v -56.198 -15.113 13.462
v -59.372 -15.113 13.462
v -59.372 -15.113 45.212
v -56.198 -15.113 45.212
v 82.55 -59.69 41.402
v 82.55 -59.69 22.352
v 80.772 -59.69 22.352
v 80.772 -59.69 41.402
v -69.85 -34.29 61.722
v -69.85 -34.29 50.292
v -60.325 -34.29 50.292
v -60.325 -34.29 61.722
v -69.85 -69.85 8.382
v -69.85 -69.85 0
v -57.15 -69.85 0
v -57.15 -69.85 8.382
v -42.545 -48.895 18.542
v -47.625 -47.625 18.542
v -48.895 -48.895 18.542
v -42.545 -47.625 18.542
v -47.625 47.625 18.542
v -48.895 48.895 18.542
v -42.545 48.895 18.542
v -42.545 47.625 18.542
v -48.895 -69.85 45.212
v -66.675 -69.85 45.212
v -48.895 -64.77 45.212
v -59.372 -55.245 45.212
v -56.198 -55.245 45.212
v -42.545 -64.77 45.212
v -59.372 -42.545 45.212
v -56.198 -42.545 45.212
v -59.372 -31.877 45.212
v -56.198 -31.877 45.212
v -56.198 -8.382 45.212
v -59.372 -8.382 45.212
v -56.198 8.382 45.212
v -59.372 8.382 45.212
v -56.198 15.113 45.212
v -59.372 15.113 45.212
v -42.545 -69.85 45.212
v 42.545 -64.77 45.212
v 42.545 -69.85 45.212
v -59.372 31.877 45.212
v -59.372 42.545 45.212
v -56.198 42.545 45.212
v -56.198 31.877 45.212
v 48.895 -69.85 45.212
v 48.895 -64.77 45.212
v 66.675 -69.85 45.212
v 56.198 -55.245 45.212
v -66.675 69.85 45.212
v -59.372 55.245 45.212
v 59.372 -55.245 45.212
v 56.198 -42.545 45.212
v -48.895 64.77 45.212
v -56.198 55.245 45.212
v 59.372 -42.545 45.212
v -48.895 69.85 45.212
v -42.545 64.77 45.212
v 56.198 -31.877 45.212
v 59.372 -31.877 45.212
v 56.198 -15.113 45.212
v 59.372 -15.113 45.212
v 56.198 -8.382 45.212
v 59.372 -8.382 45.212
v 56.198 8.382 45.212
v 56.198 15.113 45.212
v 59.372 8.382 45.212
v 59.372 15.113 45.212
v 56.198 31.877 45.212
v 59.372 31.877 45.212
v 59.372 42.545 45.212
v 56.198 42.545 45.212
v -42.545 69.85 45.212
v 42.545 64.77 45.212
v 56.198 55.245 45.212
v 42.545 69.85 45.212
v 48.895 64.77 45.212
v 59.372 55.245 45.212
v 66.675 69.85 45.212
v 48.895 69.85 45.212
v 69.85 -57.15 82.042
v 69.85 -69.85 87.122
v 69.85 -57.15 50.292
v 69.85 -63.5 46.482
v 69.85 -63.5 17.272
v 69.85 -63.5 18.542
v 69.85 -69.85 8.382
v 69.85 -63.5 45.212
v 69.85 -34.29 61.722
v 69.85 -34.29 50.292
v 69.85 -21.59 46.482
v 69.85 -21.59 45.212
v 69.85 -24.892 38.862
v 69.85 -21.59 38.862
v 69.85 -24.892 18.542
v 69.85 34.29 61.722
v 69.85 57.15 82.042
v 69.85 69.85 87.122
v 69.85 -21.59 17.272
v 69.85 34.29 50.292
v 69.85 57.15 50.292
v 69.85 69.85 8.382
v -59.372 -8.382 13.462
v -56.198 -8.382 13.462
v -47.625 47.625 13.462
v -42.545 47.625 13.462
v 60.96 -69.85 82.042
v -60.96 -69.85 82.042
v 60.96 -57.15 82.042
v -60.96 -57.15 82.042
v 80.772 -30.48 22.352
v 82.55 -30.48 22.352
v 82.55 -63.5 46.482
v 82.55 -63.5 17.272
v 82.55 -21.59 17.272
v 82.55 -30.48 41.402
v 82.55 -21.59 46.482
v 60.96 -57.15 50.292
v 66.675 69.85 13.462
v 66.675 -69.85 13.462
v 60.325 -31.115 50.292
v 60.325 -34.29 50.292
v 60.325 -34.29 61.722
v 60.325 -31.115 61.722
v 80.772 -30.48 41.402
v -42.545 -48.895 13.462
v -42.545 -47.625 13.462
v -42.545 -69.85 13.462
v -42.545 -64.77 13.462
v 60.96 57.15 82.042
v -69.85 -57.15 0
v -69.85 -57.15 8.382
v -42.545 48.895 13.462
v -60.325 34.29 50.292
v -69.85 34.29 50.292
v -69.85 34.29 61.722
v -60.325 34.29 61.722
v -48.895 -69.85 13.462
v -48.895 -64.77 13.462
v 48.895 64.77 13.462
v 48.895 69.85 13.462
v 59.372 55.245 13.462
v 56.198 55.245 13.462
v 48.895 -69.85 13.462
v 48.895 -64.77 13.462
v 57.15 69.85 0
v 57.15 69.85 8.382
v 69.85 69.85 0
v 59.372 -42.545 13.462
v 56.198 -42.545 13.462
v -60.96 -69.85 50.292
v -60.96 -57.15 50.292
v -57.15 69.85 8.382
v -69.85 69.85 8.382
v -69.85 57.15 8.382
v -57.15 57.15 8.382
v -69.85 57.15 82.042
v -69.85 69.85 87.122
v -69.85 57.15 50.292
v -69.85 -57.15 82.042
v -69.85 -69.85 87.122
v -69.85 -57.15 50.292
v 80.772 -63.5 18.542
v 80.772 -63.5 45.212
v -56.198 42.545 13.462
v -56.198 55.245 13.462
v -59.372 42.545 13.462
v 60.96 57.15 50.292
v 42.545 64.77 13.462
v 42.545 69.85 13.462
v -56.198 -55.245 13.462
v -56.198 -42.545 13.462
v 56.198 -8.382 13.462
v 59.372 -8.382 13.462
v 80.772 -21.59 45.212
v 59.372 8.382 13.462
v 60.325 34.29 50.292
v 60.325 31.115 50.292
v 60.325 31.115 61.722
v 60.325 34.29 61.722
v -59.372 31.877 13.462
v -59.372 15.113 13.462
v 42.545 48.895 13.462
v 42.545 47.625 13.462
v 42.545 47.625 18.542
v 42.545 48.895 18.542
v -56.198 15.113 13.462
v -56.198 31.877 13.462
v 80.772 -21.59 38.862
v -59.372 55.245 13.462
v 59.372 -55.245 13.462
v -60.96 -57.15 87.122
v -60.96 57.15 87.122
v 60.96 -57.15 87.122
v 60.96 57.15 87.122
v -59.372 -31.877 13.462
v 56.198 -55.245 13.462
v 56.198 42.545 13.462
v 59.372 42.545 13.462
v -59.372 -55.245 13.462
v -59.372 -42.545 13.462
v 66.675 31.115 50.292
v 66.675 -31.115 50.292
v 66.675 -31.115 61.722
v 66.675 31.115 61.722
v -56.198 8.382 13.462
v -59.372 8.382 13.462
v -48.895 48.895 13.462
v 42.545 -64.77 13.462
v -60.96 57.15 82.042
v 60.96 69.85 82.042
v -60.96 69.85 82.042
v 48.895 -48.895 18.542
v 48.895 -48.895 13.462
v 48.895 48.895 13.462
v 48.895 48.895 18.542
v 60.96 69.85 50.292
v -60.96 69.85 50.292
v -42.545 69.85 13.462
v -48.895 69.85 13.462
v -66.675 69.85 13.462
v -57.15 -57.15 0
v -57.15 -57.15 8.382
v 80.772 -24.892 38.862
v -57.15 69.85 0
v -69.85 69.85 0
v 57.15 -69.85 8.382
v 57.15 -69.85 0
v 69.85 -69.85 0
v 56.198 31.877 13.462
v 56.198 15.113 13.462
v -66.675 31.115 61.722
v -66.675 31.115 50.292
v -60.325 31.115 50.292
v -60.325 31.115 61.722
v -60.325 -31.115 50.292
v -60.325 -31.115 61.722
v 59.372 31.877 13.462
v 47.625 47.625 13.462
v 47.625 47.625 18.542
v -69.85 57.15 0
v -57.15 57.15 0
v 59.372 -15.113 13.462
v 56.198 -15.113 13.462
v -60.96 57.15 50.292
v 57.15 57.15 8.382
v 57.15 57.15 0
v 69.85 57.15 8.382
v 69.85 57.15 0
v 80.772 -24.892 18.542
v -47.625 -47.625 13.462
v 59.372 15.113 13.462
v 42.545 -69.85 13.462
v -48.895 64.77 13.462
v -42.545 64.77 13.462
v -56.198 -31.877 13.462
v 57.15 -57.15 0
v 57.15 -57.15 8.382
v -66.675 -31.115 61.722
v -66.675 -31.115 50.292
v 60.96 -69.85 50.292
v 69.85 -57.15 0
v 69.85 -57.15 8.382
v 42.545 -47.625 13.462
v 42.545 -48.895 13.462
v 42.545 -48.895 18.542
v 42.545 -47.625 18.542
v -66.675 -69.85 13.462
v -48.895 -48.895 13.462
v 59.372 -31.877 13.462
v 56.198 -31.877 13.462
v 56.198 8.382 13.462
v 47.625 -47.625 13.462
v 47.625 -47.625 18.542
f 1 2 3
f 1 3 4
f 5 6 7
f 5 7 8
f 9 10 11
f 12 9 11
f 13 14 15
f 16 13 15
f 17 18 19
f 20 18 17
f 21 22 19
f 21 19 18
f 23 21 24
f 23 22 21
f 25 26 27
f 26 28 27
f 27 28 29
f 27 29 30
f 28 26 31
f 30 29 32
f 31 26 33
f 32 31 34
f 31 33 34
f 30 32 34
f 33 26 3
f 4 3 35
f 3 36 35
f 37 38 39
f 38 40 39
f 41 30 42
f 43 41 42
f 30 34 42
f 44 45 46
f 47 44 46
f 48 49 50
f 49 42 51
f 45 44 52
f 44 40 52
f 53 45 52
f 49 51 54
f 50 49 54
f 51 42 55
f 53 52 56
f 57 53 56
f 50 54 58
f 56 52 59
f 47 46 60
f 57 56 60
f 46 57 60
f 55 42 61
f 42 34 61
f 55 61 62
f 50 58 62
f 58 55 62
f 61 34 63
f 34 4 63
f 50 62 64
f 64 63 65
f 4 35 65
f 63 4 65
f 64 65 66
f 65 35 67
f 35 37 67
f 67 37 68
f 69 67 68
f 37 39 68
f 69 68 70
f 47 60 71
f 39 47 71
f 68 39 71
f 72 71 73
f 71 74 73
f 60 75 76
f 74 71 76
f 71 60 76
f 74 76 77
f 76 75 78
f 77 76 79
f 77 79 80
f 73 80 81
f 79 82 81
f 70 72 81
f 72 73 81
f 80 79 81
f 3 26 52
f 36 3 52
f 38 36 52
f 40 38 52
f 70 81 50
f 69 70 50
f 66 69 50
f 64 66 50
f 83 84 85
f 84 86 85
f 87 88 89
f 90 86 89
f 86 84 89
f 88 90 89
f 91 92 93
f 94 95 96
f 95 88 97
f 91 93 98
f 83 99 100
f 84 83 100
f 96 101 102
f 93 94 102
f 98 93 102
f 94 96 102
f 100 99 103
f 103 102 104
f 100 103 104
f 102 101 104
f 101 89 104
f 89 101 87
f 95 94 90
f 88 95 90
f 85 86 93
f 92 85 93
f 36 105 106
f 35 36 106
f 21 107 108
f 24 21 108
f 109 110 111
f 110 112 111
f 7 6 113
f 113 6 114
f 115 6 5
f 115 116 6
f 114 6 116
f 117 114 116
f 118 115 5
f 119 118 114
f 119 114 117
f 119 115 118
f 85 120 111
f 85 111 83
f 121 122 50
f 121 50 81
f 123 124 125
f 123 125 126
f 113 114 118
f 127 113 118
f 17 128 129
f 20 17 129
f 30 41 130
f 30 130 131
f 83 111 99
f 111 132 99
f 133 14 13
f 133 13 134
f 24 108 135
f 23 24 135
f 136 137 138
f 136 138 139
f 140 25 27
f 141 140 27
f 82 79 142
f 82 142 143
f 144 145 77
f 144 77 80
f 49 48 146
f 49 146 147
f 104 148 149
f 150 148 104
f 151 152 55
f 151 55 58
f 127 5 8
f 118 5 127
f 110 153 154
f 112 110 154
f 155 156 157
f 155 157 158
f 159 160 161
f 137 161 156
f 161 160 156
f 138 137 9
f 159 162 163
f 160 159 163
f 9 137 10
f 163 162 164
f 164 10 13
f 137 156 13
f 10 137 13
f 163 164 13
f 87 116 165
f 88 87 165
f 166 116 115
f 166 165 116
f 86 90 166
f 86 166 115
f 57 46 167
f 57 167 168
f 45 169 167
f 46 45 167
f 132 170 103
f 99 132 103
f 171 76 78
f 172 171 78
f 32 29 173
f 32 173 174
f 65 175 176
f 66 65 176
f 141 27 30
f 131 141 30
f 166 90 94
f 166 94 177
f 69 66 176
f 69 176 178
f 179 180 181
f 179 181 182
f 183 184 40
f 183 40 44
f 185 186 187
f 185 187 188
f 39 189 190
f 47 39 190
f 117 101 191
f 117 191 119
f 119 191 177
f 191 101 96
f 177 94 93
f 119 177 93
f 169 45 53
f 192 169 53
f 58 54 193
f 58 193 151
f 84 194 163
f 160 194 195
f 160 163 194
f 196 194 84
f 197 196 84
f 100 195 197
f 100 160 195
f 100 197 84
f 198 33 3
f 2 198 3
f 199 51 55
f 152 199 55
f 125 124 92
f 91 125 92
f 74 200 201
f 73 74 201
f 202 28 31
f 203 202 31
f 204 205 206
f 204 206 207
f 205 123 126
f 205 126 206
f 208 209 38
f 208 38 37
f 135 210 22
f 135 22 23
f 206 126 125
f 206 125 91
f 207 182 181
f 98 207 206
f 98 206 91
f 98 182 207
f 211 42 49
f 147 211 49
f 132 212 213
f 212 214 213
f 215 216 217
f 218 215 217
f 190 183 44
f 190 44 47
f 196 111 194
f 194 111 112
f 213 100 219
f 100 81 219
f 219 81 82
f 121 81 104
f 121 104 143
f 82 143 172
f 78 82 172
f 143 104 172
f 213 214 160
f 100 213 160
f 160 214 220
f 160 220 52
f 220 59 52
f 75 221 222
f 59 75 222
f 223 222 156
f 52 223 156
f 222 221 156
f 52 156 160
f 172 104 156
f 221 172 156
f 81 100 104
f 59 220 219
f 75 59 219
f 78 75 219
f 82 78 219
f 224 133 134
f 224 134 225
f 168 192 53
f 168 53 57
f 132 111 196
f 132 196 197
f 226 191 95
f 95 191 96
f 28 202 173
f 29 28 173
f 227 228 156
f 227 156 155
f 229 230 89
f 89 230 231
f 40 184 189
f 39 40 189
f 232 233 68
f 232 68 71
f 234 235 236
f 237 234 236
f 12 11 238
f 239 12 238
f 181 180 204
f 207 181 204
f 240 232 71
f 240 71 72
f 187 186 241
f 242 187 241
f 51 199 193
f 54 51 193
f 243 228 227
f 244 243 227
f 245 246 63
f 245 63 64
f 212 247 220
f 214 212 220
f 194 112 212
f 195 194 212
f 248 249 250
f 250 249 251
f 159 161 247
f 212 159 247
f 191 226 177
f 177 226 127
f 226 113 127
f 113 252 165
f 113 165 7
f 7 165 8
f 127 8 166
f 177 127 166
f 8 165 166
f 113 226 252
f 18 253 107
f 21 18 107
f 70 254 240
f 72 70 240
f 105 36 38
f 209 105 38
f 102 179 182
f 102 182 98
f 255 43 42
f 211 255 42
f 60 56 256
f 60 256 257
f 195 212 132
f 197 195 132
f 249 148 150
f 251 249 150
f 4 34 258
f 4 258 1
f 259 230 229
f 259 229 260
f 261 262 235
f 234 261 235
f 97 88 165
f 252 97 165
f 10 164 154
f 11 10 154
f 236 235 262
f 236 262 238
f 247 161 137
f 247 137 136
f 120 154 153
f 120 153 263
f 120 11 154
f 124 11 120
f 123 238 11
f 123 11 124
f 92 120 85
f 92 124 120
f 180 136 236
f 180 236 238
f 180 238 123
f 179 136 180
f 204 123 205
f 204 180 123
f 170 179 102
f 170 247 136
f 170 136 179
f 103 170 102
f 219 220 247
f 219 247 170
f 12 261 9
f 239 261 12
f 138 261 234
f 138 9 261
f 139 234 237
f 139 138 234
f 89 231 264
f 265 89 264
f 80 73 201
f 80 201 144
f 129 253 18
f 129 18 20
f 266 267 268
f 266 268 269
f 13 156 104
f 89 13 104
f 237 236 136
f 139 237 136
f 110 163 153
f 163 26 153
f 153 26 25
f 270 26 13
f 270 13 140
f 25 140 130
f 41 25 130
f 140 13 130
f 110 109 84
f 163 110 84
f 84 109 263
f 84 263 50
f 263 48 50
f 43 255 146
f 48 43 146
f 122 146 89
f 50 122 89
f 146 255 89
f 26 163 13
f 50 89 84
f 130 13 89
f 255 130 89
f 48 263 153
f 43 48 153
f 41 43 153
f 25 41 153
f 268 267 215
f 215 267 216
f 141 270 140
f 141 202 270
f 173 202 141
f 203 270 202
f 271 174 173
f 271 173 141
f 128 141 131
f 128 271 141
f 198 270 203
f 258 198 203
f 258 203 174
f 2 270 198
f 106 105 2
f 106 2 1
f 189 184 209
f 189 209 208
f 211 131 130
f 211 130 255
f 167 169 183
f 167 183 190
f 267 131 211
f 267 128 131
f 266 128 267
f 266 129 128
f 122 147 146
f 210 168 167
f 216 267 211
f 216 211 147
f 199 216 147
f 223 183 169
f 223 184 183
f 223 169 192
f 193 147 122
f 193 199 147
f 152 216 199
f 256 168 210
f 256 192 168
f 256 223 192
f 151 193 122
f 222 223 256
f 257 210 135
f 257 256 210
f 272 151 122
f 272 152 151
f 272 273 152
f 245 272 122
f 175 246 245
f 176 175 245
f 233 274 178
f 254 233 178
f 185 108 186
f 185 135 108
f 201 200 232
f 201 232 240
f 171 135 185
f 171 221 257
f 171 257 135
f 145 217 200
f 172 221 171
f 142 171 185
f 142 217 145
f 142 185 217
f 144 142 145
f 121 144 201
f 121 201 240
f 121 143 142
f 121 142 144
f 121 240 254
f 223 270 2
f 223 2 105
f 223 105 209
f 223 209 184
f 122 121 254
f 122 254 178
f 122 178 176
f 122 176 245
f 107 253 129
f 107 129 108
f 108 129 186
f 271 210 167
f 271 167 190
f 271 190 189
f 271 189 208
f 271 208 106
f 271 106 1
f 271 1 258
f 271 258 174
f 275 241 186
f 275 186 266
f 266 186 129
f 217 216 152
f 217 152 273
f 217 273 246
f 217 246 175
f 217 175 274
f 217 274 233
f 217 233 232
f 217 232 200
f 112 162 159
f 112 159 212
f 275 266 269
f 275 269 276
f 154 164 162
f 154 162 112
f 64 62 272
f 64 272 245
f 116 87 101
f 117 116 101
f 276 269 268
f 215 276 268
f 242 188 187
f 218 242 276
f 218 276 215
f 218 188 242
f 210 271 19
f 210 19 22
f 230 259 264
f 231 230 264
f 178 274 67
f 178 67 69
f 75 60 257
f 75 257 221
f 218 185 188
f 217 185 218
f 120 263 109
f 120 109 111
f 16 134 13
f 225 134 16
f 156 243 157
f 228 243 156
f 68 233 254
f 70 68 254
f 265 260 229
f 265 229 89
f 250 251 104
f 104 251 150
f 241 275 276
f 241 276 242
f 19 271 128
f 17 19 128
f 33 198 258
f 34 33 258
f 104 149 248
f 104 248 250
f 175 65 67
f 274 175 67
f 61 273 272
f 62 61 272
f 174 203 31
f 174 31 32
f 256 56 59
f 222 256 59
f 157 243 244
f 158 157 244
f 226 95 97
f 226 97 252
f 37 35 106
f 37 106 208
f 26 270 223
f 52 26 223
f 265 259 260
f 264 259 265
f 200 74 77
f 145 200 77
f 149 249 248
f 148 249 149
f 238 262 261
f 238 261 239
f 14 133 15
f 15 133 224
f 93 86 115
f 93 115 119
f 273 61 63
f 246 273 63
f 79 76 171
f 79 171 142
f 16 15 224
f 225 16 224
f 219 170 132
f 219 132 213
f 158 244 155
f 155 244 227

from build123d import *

# Parameters (mm, degrees)
F0_W      = 12.7
F0_H      = 12.7
F1_DEPTH  = 8.382
F2_W      = 139.7
F2_H      = 139.7
F3_DEPTH  = 5.08
F5_W      = 97.79
F5_H      = 97.79
F5_W_2    = 95.25
F5_H_2    = 95.25
F6_DEPTH  = 5.08
F7_W      = 85.09
F7_H      = 139.7
F8_DEPTH  = 5.08
F9_W      = 3.175
F9_H      = 139.7
F9_H_2    = 16.764
F9_H_3    = 12.7
F9_W_2    = 6.35
F9_H_4    = 5.08
F10_DEPTH = 31.75
F11_W     = 139.7
F11_H     = 139.7
F12_DEPTH = 5.08
F13_W     = 139.7
F13_H     = 68.58
F13_W_2   = 133.35
F13_H_2   = 62.23
F14_DEPTH = 11.43
F15_W     = 120.65
F15_H     = 85.1746347484
F16_DEPTH = 25.4
F17_W     = 8.89
F17_H     = 12.7
F18_DEPTH = 31.75
F19_W     = 8.89
F19_H     = 12.7
F19_W_2   = 121.92
F19_H_2   = 114.3
F20_DEPTH = 5.08
F21_W     = 41.91
F21_H     = 29.21
F22_DEPTH = 12.7
F23_W     = 10.922
F23_H     = 26.67
F24_DEPTH = 38.608
F25_W     = 10.922
F25_H     = 6.35
F26_DEPTH = 25.4
F27_W     = 29.21
F27_H     = 19.05
F28_DEPTH = 6.35


# Not quite as in the source:
# - a feature names something its author has since deleted; it is built from what else it names


with BuildPart() as f1:
    # F0 (on Top) → F1 (new body)
    with BuildSketch(Plane.XY):
        with Locations((-63.5, -63.5)):
            Rectangle(F0_W, F0_H)
    extrude(amount=F1_DEPTH)


with BuildPart() as f1b:
    # F0 (on Top) → F1, piece 2 (new body)
    with BuildSketch(Plane.XY):
        with Locations((63.5, -63.5)):
            Rectangle(F0_W, F0_H)
    extrude(amount=F1_DEPTH)


with BuildPart() as f1c:
    # F0 (on Top) → F1, piece 3 (new body)
    with BuildSketch(Plane.XY):
        with Locations((63.5, 63.5)):
            Rectangle(F0_W, F0_H)
    extrude(amount=F1_DEPTH)


with BuildPart() as f1d:
    # F0 (on Top) → F1, piece 4 (new body)
    with BuildSketch(Plane.XY):
        with Locations((-63.5, 63.5)):
            Rectangle(F0_W, F0_H)
    extrude(amount=F1_DEPTH)


with BuildPart() as f3:
    # F2 (on face) → F3 (new body)
    with BuildSketch(Plane.XY.offset(8.382)):
        Rectangle(F2_W, F2_H)
    extrude(amount=F3_DEPTH)

    # F5 (on face) → F6 (join)
    with BuildSketch(Plane.XY.offset(13.462)):
        Rectangle(F5_W, F5_H)
        Rectangle(F5_W_2, F5_H_2, mode=Mode.SUBTRACT)
    extrude(amount=F6_DEPTH)

    # F7 (on face) → F8 (cut)
    with BuildSketch(Plane.XY.offset(13.462)):
        Rectangle(F7_W, F7_H)
    extrude(amount=F8_DEPTH, mode=Mode.SUBTRACT)

    # F9 (on face) → F10 (join)
    with BuildSketch(Plane.XY.offset(13.462)):
        with Locations((-68.2625, 0)):
            Rectangle(F9_W, F9_H)
        with Locations((-57.785, 23.495)):
            Rectangle(F9_W, F9_H_2)
        with Locations((-57.785, 0)):
            Rectangle(F9_W, F9_H_2)
        with Locations((-57.785, -23.495)):
            Rectangle(F9_W, F9_H_2)
        with Locations((-57.785, 48.895)):
            Rectangle(F9_W, F9_H_3)
        with Locations((-57.785, -48.895)):
            Rectangle(F9_W, F9_H_3)
        with Locations((-45.72, 67.31)):
            Rectangle(F9_W_2, F9_H_4)
        with Locations((-45.72, -67.31)):
            Rectangle(F9_W_2, F9_H_4)
        with Locations((57.785, 48.895)):
            Rectangle(F9_W, F9_H_3)
        with Locations((45.72, 67.31)):
            Rectangle(F9_W_2, F9_H_4)
        with Locations((57.785, -48.895)):
            Rectangle(F9_W, F9_H_3)
        with Locations((57.785, 23.495)):
            Rectangle(F9_W, F9_H_2)
        with Locations((45.72, -67.31)):
            Rectangle(F9_W_2, F9_H_4)
        with Locations((57.785, -23.495)):
            Rectangle(F9_W, F9_H_2)
        with Locations((68.2625, 0)):
            Rectangle(F9_W, F9_H)
        with Locations((57.785, 0)):
            Rectangle(F9_W, F9_H_2)
    extrude(amount=F10_DEPTH)

    # F11 (on face) → F12 (join)
    with BuildSketch(Plane.XY.offset(45.212)):
        Rectangle(F11_W, F11_H)
    extrude(amount=F12_DEPTH)

    # F13 (on face) → F14 (join)
    with BuildSketch(Plane.XY.offset(50.292)):
        Rectangle(F13_W, F13_H)
        Rectangle(F13_W_2, F13_H_2, mode=Mode.SUBTRACT)
    extrude(amount=F14_DEPTH)

    # F15 (on face) → F16 (cut)
    with BuildSketch(Plane.XY.offset(50.292)):
        Rectangle(F15_W, F15_H)
    extrude(amount=F16_DEPTH, mode=Mode.SUBTRACT)

    # F17 (on face) → F18 (join)
    with BuildSketch(Plane.XY.offset(50.292)):
        with Locations((-65.405, 63.5)):
            Rectangle(F17_W, F17_H)
        with Locations((65.405, 63.5)):
            Rectangle(F17_W, F17_H)
        with Locations((65.405, -63.5)):
            Rectangle(F17_W, F17_H)
        with Locations((-65.405, -63.5)):
            Rectangle(F17_W, F17_H)
    extrude(amount=F18_DEPTH)

    # F19 (on face) → F20 (join)
    with BuildSketch(Plane.XY.offset(82.042)):
        with Locations((-65.405, -63.5)):
            Rectangle(F19_W, F19_H)
        with Locations((0, -63.5)):
            Rectangle(F19_W_2, F19_H)
        with Locations((-65.405, 0)):
            Rectangle(F19_W, F19_H_2)
        with Locations((65.405, -63.5)):
            Rectangle(F19_W, F19_H)
        with Locations((-65.405, 63.5)):
            Rectangle(F19_W, F19_H)
        with Locations((0, 63.5)):
            Rectangle(F19_W_2, F19_H)
        with Locations((65.405, 0)):
            Rectangle(F19_W, F19_H_2)
        with Locations((65.405, 63.5)):
            Rectangle(F19_W, F19_H)
    extrude(amount=F20_DEPTH)

    # F21 (on face) → F22 (join)
    with BuildSketch(Plane.YZ.offset(69.85)):
        with Locations((-42.545, 31.877)):
            Rectangle(F21_W, F21_H)
    extrude(amount=F22_DEPTH)

    # F23 (on face) → F24 (cut)
    with BuildSketch(Plane.XZ.offset(63.5)):
        with Locations((75.311, 31.877)):
            Rectangle(F23_W, F23_H)
    extrude(amount=-F24_DEPTH, mode=Mode.SUBTRACT)

    # F25 (on face) → F26 (cut)
    with BuildSketch(Plane(origin=(0, -21.59, 0), x_dir=(-1, 0, 0), z_dir=(0, 1, 0))):
        with Locations((-75.311, 42.037)):
            Rectangle(F25_W, F25_H)
    extrude(amount=-F26_DEPTH, mode=Mode.SUBTRACT)

    # F27 (on face) → F28 (cut)
    with BuildSketch(Plane.YZ.offset(82.55)):
        with Locations((-45.085, 31.877)):
            Rectangle(F27_W, F27_H)
    extrude(amount=-F28_DEPTH, mode=Mode.SUBTRACT)


solid = Compound([f1.part, f1b.part, f1c.part, f1d.part, f3.part])
